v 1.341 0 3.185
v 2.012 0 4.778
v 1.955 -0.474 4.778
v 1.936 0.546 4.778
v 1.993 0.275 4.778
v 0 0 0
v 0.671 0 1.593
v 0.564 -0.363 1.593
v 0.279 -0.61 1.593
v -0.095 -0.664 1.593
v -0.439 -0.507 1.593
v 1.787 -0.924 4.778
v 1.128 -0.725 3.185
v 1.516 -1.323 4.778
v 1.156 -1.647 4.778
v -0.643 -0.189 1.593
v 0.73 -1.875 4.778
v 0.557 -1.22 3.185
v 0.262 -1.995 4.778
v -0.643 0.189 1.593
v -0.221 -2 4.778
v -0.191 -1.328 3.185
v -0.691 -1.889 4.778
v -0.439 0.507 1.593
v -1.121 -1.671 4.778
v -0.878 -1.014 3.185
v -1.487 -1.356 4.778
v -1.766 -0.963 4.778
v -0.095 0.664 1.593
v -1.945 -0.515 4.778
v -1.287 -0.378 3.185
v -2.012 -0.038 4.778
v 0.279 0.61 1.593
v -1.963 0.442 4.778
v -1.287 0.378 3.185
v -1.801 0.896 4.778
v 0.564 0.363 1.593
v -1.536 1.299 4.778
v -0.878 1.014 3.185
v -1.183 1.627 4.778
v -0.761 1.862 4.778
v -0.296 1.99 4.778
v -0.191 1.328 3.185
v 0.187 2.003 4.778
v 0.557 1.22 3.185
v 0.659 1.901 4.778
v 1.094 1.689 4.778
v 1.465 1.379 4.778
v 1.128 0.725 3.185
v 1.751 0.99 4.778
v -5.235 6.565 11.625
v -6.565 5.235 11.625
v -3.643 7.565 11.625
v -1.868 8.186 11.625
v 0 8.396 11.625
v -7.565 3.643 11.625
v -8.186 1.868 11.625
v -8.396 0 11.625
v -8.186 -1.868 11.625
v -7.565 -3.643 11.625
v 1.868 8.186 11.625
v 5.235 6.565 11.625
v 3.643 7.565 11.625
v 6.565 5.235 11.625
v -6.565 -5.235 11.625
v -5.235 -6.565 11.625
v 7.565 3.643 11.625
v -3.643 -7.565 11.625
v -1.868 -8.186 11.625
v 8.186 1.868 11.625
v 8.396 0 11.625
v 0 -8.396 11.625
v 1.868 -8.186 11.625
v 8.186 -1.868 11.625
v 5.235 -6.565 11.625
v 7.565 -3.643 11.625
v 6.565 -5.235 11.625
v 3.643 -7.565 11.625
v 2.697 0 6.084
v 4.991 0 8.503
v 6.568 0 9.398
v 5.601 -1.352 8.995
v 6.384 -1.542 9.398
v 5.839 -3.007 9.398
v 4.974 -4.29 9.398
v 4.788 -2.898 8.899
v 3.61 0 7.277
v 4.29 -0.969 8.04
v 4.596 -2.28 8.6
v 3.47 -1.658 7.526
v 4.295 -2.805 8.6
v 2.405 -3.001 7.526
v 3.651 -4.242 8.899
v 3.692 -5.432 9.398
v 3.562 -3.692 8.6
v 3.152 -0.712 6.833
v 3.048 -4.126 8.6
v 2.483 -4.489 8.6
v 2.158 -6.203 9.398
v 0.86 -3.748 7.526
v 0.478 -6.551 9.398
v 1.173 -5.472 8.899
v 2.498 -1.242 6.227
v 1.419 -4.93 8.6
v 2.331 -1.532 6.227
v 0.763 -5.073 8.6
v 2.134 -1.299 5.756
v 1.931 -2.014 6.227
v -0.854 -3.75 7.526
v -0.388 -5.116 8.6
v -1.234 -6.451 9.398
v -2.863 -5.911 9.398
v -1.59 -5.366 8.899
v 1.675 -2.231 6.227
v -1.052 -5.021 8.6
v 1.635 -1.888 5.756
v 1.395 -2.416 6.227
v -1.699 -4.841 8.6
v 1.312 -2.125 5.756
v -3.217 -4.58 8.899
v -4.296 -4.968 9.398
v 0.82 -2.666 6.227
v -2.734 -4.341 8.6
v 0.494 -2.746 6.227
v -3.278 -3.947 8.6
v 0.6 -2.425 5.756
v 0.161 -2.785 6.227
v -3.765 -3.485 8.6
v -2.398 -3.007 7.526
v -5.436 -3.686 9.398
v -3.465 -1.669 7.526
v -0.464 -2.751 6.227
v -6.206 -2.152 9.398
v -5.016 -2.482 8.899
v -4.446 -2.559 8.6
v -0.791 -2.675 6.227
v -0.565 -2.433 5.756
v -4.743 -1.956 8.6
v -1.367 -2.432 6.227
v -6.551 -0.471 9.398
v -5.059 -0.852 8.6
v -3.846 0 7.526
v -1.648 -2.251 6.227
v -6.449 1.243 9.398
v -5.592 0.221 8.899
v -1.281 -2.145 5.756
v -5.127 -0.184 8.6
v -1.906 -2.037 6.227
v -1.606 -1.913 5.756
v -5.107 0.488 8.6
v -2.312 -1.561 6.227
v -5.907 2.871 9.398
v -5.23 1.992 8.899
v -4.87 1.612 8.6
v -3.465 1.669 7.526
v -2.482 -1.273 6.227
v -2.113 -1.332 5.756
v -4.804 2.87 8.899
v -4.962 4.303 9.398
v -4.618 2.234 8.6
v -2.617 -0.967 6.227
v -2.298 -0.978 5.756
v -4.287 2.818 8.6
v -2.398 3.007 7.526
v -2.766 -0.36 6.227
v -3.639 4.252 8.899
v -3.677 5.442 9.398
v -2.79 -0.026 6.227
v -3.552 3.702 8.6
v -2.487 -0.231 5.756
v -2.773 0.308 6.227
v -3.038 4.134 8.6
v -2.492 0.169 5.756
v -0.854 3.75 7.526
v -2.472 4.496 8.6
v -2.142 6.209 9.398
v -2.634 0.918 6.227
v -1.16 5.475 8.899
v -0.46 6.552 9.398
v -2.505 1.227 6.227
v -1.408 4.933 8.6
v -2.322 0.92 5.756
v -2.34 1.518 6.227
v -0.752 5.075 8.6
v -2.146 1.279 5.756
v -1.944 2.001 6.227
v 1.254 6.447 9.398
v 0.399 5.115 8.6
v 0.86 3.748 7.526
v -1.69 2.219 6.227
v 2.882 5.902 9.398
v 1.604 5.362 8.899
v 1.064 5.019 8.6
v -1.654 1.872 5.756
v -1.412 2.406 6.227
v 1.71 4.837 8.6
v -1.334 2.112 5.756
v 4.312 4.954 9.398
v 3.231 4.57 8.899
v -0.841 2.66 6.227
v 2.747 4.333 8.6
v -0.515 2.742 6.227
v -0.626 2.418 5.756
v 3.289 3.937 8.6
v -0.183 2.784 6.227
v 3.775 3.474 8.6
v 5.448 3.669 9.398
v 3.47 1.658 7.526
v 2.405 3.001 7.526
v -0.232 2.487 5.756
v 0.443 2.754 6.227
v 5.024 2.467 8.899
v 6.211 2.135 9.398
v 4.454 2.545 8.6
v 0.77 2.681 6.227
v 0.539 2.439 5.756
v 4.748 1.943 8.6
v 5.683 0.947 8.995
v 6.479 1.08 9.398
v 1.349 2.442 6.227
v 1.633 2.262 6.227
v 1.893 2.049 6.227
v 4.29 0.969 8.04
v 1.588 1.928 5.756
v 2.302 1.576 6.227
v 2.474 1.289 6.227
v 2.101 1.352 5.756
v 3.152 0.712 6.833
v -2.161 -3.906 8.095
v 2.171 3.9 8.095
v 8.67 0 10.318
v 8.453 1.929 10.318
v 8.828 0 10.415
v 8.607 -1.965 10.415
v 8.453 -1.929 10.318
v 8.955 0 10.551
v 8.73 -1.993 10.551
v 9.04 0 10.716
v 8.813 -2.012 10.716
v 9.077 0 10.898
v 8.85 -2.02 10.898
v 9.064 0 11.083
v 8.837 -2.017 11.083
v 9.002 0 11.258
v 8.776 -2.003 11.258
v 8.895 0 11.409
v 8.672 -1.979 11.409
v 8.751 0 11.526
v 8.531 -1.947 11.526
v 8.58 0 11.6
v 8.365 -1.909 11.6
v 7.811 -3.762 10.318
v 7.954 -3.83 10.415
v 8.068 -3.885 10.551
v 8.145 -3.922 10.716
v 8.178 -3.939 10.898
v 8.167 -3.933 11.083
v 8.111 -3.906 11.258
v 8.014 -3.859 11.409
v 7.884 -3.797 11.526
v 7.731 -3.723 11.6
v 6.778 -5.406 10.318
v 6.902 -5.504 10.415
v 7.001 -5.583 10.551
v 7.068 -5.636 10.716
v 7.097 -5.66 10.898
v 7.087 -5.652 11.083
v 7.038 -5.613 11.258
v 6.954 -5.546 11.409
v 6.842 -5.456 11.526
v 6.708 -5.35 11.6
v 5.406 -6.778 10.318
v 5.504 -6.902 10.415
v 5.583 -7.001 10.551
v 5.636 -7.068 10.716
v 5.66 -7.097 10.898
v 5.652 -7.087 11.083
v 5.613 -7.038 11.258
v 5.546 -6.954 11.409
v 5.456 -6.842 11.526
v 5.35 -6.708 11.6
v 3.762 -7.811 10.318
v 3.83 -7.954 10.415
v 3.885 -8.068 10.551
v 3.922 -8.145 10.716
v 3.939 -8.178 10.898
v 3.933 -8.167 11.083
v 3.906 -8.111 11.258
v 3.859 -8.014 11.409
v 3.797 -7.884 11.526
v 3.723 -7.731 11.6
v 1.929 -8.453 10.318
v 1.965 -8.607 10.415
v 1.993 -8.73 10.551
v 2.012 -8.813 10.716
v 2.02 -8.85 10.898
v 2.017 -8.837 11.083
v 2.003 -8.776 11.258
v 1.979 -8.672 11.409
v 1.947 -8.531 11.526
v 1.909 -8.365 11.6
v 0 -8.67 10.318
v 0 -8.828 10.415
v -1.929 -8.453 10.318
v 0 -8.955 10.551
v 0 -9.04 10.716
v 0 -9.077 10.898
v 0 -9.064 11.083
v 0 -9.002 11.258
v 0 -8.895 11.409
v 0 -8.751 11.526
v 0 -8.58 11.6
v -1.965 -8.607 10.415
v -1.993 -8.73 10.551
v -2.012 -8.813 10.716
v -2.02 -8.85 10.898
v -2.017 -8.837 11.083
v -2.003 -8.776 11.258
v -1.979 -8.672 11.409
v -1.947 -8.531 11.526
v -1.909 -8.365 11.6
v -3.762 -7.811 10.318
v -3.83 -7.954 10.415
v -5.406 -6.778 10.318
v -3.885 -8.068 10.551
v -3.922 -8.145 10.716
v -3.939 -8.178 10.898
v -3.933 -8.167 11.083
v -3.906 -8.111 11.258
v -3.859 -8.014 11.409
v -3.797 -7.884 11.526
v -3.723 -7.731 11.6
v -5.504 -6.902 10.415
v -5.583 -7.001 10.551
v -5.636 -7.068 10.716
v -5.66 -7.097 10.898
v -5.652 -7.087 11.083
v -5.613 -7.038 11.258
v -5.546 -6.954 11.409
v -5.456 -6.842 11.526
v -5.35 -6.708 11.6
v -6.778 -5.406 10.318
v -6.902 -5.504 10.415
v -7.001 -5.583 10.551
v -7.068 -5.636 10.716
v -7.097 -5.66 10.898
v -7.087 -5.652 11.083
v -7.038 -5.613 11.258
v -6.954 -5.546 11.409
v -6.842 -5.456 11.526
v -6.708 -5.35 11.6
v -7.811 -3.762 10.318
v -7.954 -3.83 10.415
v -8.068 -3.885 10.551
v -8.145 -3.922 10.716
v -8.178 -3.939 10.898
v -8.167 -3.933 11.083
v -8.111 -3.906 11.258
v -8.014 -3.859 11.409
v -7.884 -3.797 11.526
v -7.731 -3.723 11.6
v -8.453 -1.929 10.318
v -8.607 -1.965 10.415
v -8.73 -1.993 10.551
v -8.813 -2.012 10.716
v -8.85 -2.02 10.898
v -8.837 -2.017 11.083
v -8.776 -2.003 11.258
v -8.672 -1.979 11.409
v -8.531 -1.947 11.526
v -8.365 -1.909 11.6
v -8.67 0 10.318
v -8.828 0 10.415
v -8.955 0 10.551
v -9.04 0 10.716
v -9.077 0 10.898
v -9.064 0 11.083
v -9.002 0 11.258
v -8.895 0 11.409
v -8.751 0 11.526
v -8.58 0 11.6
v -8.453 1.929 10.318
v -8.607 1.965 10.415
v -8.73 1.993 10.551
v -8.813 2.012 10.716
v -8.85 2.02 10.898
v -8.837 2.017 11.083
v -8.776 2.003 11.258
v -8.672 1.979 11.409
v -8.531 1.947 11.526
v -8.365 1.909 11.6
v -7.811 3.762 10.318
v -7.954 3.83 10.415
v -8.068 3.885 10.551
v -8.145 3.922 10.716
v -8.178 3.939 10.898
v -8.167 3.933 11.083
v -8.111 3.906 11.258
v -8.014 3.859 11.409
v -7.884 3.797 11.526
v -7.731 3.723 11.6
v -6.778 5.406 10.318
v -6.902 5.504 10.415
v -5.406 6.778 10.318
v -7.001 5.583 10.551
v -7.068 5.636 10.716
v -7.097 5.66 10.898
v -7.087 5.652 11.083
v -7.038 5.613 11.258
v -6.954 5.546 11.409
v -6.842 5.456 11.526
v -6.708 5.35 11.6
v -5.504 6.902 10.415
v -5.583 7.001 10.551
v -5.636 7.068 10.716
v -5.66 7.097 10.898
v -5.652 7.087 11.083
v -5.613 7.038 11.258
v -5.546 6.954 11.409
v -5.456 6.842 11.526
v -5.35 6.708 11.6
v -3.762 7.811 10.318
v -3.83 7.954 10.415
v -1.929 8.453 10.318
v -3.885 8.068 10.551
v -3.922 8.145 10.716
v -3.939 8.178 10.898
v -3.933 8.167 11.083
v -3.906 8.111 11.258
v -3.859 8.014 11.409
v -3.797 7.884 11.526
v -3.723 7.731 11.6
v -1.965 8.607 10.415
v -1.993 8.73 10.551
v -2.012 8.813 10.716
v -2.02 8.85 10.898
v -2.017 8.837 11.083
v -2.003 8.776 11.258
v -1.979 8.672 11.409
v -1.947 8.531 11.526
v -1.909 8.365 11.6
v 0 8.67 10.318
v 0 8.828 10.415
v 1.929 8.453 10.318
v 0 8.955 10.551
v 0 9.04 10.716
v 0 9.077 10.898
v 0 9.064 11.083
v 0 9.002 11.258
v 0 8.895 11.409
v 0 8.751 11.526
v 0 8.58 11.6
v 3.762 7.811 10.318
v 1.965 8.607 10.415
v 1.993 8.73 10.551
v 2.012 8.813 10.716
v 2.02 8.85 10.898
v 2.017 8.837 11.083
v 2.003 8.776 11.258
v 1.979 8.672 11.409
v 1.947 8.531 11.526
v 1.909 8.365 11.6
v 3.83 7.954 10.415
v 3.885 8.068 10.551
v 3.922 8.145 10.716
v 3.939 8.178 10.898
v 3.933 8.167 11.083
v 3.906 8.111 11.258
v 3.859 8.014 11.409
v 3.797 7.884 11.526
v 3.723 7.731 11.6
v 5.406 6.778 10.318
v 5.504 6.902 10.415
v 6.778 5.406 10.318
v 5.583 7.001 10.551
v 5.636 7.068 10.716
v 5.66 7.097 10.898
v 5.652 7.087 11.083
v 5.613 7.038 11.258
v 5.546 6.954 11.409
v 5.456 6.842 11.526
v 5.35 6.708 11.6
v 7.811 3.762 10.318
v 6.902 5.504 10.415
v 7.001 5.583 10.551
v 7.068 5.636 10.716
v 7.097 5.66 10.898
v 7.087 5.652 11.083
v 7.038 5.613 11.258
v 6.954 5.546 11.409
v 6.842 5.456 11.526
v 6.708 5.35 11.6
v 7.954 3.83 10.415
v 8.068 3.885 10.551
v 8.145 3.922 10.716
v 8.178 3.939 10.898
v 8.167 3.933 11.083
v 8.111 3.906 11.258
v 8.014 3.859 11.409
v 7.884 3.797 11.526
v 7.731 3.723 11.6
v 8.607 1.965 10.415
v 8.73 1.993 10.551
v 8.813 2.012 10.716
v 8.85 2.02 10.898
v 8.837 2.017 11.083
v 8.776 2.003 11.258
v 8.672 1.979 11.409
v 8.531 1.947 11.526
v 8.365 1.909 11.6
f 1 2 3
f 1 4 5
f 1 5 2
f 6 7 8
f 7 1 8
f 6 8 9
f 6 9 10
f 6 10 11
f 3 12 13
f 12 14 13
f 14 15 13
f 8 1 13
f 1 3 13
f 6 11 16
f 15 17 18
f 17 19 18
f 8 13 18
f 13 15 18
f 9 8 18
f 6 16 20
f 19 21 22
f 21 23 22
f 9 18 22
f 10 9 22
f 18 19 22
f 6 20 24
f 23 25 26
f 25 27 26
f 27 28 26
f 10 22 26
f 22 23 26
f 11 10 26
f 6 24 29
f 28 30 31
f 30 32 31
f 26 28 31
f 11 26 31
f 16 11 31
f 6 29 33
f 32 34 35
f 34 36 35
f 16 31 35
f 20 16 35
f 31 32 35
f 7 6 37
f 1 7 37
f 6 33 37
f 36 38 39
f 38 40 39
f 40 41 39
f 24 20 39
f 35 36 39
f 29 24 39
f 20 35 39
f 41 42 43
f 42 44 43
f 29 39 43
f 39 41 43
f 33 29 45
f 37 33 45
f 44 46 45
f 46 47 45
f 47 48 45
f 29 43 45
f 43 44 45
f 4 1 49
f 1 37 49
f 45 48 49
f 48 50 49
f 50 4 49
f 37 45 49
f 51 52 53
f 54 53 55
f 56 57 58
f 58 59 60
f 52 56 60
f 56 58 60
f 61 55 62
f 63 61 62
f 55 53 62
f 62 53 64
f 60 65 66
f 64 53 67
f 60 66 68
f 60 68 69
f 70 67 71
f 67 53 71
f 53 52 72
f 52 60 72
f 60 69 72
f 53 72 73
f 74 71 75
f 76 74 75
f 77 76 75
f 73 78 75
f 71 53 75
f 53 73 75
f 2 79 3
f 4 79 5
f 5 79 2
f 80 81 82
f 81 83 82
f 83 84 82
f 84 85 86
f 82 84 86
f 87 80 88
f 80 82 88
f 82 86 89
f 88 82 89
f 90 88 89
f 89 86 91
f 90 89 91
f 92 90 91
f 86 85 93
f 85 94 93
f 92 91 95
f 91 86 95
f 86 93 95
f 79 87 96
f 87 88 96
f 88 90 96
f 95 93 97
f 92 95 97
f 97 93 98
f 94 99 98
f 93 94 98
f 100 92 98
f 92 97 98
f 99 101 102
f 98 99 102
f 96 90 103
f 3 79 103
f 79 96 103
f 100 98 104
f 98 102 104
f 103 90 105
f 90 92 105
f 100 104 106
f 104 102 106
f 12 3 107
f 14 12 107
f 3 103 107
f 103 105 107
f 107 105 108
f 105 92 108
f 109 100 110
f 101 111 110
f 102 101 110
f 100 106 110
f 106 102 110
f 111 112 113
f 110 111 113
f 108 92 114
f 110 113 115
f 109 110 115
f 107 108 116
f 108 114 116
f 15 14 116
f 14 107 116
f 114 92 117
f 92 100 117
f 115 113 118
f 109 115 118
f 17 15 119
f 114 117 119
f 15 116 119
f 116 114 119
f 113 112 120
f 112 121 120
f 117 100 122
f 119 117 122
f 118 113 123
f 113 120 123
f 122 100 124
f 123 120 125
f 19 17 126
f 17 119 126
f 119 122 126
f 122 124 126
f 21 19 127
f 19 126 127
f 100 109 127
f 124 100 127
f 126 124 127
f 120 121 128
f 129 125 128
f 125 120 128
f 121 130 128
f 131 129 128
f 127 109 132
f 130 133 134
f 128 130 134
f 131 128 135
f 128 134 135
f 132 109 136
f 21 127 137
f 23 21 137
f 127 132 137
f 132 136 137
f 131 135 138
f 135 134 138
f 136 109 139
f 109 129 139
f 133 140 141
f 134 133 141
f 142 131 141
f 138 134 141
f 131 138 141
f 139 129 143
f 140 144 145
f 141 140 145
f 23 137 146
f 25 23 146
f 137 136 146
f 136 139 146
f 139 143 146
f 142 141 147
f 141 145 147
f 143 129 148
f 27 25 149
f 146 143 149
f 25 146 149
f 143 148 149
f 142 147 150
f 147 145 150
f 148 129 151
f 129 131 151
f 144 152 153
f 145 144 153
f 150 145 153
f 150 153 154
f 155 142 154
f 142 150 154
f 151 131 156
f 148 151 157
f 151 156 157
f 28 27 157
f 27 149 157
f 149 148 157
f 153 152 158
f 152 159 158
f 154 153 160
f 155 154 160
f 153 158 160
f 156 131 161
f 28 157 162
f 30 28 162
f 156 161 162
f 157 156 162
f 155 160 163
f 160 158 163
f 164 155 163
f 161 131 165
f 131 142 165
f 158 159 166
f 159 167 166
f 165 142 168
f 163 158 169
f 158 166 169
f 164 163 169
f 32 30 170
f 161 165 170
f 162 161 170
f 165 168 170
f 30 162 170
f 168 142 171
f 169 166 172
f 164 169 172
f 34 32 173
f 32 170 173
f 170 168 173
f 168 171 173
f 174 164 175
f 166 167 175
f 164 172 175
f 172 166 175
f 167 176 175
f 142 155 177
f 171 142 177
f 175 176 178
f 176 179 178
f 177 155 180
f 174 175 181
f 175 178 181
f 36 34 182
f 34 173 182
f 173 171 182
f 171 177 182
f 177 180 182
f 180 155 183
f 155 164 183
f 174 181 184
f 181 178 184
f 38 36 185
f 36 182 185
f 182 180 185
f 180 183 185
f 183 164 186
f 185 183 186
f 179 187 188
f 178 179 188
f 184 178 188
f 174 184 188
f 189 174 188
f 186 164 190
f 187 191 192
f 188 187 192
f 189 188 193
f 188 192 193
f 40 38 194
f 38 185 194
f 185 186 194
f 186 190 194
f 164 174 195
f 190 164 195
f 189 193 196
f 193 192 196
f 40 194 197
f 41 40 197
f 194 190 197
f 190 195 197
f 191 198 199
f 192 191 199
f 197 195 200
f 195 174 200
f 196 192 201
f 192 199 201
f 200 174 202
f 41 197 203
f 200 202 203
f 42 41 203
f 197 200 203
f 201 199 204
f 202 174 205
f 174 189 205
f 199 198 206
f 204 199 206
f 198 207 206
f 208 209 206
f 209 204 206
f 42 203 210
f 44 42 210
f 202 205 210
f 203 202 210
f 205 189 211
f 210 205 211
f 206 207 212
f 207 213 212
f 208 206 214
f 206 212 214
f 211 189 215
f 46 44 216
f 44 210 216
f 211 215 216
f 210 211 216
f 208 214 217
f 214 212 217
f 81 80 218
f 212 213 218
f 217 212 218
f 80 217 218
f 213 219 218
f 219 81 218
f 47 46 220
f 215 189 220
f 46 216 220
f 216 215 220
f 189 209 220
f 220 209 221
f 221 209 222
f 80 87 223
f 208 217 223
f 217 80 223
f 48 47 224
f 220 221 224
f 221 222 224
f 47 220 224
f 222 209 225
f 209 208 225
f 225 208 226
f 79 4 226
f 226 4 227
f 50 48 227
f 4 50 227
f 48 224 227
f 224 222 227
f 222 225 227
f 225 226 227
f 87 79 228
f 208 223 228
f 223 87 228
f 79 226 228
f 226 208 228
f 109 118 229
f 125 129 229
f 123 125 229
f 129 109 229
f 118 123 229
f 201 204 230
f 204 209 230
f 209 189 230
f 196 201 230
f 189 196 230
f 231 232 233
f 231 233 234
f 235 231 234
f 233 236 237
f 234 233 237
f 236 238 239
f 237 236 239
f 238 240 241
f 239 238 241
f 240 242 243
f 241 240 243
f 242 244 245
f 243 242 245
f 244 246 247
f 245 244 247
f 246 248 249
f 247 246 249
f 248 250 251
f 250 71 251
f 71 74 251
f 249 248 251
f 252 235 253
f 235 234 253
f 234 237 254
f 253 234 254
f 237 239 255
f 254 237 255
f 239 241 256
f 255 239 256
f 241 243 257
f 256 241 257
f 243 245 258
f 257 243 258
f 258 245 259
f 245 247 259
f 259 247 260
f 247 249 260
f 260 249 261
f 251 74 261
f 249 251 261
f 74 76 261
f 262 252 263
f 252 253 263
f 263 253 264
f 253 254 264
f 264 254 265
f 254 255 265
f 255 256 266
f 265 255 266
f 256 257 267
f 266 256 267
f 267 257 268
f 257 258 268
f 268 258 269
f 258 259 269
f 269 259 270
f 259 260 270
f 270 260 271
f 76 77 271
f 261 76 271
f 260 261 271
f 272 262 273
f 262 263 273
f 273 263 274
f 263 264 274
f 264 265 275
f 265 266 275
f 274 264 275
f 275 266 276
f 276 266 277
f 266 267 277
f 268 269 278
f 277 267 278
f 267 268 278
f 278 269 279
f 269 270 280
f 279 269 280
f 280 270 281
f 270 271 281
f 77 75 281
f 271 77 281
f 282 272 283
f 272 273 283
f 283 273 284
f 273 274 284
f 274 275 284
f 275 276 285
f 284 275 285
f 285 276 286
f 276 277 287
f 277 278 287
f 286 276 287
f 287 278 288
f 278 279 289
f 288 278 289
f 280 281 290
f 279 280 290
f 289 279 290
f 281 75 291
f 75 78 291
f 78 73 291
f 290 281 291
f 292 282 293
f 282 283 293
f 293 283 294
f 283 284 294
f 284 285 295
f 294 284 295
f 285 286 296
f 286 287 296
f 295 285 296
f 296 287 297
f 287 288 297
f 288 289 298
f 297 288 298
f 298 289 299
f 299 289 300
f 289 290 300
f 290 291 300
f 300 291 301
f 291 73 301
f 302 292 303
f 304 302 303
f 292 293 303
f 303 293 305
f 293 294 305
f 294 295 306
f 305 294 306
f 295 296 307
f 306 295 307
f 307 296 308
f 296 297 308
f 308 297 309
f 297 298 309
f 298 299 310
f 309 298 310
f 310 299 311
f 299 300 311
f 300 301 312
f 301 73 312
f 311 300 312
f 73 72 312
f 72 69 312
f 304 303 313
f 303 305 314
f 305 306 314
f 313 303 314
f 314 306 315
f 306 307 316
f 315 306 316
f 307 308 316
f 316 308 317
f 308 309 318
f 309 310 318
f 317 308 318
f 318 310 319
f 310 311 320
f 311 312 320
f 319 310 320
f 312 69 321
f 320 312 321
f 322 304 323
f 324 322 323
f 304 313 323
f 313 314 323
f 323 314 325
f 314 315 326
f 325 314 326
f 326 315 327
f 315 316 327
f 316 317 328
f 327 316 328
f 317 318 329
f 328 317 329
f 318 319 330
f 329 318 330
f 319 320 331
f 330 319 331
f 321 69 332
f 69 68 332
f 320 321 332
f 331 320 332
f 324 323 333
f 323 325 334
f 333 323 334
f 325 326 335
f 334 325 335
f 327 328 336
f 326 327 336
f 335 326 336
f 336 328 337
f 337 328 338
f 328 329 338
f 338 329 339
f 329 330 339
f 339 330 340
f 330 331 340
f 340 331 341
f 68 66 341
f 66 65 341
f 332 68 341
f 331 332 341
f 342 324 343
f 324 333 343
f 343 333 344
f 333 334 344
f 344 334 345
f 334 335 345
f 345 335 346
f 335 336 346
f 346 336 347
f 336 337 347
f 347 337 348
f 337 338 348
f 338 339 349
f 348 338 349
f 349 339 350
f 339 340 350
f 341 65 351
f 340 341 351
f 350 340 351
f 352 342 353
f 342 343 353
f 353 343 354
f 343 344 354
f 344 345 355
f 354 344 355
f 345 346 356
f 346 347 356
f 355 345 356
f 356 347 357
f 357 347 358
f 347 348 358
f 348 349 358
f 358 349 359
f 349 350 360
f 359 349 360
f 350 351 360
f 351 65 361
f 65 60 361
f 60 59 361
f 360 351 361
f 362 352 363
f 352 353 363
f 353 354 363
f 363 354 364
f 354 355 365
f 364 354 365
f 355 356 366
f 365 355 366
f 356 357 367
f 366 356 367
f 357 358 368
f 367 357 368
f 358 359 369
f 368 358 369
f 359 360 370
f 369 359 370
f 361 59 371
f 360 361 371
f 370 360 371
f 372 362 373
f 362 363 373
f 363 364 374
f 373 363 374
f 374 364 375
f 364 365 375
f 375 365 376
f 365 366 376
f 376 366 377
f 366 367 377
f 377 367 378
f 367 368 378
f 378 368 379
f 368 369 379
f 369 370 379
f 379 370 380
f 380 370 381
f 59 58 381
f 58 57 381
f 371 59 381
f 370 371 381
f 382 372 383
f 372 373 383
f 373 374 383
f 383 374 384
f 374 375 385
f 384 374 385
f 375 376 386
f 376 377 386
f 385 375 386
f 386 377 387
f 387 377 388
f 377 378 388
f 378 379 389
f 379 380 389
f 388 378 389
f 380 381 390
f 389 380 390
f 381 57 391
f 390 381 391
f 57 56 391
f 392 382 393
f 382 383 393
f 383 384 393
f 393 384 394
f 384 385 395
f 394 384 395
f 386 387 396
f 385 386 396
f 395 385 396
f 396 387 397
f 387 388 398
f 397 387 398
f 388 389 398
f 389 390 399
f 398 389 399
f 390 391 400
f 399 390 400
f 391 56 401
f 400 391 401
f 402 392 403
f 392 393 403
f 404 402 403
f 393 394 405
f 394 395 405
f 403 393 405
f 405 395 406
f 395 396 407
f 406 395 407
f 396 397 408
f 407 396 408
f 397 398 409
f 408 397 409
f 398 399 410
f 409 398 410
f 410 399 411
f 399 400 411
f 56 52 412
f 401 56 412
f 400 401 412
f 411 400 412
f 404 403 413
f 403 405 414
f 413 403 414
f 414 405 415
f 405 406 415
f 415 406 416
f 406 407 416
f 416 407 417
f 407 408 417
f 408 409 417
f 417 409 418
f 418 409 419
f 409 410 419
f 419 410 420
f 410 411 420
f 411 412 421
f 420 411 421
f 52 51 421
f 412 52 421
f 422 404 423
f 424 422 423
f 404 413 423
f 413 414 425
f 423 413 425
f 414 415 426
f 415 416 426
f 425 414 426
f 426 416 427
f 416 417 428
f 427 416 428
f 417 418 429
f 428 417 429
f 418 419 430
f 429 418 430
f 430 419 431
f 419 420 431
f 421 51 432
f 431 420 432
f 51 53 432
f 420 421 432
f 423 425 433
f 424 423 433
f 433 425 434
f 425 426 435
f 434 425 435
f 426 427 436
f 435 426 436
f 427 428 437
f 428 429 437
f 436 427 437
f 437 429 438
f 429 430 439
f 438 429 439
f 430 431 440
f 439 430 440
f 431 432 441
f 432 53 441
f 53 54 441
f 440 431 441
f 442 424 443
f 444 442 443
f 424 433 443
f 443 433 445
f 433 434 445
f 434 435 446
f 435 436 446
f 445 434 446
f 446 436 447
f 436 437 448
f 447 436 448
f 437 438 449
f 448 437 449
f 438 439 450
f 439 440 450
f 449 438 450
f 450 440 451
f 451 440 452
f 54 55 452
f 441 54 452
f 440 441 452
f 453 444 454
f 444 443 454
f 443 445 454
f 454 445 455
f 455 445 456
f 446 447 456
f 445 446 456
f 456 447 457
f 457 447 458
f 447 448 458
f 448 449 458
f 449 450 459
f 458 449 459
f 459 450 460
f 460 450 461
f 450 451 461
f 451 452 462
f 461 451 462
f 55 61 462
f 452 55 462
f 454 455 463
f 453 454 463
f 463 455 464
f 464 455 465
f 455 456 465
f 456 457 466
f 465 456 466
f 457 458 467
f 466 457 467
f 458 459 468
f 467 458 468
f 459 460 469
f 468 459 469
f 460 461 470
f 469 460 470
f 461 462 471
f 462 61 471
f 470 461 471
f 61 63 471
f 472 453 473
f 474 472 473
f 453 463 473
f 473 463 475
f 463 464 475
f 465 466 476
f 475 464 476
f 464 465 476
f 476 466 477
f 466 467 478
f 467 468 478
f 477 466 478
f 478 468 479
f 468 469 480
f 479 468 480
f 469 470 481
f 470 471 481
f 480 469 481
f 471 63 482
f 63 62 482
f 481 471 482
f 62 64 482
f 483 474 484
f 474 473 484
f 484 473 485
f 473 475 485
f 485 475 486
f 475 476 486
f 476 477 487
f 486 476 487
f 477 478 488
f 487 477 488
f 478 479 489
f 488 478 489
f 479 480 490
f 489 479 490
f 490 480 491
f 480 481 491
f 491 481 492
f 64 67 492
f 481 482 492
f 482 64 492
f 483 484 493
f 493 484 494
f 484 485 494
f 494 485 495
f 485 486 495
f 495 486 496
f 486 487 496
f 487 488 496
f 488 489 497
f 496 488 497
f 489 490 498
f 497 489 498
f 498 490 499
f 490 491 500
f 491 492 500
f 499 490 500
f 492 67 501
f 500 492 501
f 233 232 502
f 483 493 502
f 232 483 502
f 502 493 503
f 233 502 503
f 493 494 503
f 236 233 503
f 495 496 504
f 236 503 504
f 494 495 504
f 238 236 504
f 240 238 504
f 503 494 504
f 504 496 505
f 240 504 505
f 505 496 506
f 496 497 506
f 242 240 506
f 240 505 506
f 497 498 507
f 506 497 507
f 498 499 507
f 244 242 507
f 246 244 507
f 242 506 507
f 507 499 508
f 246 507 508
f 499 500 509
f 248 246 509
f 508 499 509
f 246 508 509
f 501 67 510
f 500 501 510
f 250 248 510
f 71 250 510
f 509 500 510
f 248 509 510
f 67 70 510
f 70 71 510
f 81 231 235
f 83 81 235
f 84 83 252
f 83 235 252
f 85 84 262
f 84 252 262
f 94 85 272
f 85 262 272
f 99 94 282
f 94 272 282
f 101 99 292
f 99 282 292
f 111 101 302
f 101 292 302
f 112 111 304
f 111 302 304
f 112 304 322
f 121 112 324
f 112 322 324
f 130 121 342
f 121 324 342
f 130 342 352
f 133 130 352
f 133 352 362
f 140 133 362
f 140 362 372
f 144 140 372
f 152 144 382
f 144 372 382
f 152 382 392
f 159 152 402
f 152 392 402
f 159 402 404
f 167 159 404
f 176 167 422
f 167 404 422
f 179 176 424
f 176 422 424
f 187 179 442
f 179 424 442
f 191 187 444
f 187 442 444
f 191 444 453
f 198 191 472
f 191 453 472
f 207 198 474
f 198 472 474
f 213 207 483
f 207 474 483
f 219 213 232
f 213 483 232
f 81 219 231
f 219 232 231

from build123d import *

# Parameters (mm, degrees)
F2_R = 0.682367
F3_R = 8.749241


with BuildPart() as f1:
    # F0 (on Front) → F1 (revolve)
    with BuildSketch(Plane.XZ):
        Polygon((0, 11.625385), (0, 0), (3.367648, 7.997596), (11.65795, 11.625385), align=None)
    revolve(axis=Axis((0, 0, 5.812692), (0, 0, -1)))

    # F2
    f2_edges = [f1.edges().sort_by_distance(p)[0] for p in [
        (-11.65795, 0, 11.625385),
    ]]
    fillet(f2_edges, radius=F2_R)

    # F3
    f3_edges = [f1.edges().sort_by_distance(p)[0] for p in [
        (-3.367648, 0, 7.997596),
    ]]
    fillet(f3_edges, radius=F3_R)


solid = f1.part
